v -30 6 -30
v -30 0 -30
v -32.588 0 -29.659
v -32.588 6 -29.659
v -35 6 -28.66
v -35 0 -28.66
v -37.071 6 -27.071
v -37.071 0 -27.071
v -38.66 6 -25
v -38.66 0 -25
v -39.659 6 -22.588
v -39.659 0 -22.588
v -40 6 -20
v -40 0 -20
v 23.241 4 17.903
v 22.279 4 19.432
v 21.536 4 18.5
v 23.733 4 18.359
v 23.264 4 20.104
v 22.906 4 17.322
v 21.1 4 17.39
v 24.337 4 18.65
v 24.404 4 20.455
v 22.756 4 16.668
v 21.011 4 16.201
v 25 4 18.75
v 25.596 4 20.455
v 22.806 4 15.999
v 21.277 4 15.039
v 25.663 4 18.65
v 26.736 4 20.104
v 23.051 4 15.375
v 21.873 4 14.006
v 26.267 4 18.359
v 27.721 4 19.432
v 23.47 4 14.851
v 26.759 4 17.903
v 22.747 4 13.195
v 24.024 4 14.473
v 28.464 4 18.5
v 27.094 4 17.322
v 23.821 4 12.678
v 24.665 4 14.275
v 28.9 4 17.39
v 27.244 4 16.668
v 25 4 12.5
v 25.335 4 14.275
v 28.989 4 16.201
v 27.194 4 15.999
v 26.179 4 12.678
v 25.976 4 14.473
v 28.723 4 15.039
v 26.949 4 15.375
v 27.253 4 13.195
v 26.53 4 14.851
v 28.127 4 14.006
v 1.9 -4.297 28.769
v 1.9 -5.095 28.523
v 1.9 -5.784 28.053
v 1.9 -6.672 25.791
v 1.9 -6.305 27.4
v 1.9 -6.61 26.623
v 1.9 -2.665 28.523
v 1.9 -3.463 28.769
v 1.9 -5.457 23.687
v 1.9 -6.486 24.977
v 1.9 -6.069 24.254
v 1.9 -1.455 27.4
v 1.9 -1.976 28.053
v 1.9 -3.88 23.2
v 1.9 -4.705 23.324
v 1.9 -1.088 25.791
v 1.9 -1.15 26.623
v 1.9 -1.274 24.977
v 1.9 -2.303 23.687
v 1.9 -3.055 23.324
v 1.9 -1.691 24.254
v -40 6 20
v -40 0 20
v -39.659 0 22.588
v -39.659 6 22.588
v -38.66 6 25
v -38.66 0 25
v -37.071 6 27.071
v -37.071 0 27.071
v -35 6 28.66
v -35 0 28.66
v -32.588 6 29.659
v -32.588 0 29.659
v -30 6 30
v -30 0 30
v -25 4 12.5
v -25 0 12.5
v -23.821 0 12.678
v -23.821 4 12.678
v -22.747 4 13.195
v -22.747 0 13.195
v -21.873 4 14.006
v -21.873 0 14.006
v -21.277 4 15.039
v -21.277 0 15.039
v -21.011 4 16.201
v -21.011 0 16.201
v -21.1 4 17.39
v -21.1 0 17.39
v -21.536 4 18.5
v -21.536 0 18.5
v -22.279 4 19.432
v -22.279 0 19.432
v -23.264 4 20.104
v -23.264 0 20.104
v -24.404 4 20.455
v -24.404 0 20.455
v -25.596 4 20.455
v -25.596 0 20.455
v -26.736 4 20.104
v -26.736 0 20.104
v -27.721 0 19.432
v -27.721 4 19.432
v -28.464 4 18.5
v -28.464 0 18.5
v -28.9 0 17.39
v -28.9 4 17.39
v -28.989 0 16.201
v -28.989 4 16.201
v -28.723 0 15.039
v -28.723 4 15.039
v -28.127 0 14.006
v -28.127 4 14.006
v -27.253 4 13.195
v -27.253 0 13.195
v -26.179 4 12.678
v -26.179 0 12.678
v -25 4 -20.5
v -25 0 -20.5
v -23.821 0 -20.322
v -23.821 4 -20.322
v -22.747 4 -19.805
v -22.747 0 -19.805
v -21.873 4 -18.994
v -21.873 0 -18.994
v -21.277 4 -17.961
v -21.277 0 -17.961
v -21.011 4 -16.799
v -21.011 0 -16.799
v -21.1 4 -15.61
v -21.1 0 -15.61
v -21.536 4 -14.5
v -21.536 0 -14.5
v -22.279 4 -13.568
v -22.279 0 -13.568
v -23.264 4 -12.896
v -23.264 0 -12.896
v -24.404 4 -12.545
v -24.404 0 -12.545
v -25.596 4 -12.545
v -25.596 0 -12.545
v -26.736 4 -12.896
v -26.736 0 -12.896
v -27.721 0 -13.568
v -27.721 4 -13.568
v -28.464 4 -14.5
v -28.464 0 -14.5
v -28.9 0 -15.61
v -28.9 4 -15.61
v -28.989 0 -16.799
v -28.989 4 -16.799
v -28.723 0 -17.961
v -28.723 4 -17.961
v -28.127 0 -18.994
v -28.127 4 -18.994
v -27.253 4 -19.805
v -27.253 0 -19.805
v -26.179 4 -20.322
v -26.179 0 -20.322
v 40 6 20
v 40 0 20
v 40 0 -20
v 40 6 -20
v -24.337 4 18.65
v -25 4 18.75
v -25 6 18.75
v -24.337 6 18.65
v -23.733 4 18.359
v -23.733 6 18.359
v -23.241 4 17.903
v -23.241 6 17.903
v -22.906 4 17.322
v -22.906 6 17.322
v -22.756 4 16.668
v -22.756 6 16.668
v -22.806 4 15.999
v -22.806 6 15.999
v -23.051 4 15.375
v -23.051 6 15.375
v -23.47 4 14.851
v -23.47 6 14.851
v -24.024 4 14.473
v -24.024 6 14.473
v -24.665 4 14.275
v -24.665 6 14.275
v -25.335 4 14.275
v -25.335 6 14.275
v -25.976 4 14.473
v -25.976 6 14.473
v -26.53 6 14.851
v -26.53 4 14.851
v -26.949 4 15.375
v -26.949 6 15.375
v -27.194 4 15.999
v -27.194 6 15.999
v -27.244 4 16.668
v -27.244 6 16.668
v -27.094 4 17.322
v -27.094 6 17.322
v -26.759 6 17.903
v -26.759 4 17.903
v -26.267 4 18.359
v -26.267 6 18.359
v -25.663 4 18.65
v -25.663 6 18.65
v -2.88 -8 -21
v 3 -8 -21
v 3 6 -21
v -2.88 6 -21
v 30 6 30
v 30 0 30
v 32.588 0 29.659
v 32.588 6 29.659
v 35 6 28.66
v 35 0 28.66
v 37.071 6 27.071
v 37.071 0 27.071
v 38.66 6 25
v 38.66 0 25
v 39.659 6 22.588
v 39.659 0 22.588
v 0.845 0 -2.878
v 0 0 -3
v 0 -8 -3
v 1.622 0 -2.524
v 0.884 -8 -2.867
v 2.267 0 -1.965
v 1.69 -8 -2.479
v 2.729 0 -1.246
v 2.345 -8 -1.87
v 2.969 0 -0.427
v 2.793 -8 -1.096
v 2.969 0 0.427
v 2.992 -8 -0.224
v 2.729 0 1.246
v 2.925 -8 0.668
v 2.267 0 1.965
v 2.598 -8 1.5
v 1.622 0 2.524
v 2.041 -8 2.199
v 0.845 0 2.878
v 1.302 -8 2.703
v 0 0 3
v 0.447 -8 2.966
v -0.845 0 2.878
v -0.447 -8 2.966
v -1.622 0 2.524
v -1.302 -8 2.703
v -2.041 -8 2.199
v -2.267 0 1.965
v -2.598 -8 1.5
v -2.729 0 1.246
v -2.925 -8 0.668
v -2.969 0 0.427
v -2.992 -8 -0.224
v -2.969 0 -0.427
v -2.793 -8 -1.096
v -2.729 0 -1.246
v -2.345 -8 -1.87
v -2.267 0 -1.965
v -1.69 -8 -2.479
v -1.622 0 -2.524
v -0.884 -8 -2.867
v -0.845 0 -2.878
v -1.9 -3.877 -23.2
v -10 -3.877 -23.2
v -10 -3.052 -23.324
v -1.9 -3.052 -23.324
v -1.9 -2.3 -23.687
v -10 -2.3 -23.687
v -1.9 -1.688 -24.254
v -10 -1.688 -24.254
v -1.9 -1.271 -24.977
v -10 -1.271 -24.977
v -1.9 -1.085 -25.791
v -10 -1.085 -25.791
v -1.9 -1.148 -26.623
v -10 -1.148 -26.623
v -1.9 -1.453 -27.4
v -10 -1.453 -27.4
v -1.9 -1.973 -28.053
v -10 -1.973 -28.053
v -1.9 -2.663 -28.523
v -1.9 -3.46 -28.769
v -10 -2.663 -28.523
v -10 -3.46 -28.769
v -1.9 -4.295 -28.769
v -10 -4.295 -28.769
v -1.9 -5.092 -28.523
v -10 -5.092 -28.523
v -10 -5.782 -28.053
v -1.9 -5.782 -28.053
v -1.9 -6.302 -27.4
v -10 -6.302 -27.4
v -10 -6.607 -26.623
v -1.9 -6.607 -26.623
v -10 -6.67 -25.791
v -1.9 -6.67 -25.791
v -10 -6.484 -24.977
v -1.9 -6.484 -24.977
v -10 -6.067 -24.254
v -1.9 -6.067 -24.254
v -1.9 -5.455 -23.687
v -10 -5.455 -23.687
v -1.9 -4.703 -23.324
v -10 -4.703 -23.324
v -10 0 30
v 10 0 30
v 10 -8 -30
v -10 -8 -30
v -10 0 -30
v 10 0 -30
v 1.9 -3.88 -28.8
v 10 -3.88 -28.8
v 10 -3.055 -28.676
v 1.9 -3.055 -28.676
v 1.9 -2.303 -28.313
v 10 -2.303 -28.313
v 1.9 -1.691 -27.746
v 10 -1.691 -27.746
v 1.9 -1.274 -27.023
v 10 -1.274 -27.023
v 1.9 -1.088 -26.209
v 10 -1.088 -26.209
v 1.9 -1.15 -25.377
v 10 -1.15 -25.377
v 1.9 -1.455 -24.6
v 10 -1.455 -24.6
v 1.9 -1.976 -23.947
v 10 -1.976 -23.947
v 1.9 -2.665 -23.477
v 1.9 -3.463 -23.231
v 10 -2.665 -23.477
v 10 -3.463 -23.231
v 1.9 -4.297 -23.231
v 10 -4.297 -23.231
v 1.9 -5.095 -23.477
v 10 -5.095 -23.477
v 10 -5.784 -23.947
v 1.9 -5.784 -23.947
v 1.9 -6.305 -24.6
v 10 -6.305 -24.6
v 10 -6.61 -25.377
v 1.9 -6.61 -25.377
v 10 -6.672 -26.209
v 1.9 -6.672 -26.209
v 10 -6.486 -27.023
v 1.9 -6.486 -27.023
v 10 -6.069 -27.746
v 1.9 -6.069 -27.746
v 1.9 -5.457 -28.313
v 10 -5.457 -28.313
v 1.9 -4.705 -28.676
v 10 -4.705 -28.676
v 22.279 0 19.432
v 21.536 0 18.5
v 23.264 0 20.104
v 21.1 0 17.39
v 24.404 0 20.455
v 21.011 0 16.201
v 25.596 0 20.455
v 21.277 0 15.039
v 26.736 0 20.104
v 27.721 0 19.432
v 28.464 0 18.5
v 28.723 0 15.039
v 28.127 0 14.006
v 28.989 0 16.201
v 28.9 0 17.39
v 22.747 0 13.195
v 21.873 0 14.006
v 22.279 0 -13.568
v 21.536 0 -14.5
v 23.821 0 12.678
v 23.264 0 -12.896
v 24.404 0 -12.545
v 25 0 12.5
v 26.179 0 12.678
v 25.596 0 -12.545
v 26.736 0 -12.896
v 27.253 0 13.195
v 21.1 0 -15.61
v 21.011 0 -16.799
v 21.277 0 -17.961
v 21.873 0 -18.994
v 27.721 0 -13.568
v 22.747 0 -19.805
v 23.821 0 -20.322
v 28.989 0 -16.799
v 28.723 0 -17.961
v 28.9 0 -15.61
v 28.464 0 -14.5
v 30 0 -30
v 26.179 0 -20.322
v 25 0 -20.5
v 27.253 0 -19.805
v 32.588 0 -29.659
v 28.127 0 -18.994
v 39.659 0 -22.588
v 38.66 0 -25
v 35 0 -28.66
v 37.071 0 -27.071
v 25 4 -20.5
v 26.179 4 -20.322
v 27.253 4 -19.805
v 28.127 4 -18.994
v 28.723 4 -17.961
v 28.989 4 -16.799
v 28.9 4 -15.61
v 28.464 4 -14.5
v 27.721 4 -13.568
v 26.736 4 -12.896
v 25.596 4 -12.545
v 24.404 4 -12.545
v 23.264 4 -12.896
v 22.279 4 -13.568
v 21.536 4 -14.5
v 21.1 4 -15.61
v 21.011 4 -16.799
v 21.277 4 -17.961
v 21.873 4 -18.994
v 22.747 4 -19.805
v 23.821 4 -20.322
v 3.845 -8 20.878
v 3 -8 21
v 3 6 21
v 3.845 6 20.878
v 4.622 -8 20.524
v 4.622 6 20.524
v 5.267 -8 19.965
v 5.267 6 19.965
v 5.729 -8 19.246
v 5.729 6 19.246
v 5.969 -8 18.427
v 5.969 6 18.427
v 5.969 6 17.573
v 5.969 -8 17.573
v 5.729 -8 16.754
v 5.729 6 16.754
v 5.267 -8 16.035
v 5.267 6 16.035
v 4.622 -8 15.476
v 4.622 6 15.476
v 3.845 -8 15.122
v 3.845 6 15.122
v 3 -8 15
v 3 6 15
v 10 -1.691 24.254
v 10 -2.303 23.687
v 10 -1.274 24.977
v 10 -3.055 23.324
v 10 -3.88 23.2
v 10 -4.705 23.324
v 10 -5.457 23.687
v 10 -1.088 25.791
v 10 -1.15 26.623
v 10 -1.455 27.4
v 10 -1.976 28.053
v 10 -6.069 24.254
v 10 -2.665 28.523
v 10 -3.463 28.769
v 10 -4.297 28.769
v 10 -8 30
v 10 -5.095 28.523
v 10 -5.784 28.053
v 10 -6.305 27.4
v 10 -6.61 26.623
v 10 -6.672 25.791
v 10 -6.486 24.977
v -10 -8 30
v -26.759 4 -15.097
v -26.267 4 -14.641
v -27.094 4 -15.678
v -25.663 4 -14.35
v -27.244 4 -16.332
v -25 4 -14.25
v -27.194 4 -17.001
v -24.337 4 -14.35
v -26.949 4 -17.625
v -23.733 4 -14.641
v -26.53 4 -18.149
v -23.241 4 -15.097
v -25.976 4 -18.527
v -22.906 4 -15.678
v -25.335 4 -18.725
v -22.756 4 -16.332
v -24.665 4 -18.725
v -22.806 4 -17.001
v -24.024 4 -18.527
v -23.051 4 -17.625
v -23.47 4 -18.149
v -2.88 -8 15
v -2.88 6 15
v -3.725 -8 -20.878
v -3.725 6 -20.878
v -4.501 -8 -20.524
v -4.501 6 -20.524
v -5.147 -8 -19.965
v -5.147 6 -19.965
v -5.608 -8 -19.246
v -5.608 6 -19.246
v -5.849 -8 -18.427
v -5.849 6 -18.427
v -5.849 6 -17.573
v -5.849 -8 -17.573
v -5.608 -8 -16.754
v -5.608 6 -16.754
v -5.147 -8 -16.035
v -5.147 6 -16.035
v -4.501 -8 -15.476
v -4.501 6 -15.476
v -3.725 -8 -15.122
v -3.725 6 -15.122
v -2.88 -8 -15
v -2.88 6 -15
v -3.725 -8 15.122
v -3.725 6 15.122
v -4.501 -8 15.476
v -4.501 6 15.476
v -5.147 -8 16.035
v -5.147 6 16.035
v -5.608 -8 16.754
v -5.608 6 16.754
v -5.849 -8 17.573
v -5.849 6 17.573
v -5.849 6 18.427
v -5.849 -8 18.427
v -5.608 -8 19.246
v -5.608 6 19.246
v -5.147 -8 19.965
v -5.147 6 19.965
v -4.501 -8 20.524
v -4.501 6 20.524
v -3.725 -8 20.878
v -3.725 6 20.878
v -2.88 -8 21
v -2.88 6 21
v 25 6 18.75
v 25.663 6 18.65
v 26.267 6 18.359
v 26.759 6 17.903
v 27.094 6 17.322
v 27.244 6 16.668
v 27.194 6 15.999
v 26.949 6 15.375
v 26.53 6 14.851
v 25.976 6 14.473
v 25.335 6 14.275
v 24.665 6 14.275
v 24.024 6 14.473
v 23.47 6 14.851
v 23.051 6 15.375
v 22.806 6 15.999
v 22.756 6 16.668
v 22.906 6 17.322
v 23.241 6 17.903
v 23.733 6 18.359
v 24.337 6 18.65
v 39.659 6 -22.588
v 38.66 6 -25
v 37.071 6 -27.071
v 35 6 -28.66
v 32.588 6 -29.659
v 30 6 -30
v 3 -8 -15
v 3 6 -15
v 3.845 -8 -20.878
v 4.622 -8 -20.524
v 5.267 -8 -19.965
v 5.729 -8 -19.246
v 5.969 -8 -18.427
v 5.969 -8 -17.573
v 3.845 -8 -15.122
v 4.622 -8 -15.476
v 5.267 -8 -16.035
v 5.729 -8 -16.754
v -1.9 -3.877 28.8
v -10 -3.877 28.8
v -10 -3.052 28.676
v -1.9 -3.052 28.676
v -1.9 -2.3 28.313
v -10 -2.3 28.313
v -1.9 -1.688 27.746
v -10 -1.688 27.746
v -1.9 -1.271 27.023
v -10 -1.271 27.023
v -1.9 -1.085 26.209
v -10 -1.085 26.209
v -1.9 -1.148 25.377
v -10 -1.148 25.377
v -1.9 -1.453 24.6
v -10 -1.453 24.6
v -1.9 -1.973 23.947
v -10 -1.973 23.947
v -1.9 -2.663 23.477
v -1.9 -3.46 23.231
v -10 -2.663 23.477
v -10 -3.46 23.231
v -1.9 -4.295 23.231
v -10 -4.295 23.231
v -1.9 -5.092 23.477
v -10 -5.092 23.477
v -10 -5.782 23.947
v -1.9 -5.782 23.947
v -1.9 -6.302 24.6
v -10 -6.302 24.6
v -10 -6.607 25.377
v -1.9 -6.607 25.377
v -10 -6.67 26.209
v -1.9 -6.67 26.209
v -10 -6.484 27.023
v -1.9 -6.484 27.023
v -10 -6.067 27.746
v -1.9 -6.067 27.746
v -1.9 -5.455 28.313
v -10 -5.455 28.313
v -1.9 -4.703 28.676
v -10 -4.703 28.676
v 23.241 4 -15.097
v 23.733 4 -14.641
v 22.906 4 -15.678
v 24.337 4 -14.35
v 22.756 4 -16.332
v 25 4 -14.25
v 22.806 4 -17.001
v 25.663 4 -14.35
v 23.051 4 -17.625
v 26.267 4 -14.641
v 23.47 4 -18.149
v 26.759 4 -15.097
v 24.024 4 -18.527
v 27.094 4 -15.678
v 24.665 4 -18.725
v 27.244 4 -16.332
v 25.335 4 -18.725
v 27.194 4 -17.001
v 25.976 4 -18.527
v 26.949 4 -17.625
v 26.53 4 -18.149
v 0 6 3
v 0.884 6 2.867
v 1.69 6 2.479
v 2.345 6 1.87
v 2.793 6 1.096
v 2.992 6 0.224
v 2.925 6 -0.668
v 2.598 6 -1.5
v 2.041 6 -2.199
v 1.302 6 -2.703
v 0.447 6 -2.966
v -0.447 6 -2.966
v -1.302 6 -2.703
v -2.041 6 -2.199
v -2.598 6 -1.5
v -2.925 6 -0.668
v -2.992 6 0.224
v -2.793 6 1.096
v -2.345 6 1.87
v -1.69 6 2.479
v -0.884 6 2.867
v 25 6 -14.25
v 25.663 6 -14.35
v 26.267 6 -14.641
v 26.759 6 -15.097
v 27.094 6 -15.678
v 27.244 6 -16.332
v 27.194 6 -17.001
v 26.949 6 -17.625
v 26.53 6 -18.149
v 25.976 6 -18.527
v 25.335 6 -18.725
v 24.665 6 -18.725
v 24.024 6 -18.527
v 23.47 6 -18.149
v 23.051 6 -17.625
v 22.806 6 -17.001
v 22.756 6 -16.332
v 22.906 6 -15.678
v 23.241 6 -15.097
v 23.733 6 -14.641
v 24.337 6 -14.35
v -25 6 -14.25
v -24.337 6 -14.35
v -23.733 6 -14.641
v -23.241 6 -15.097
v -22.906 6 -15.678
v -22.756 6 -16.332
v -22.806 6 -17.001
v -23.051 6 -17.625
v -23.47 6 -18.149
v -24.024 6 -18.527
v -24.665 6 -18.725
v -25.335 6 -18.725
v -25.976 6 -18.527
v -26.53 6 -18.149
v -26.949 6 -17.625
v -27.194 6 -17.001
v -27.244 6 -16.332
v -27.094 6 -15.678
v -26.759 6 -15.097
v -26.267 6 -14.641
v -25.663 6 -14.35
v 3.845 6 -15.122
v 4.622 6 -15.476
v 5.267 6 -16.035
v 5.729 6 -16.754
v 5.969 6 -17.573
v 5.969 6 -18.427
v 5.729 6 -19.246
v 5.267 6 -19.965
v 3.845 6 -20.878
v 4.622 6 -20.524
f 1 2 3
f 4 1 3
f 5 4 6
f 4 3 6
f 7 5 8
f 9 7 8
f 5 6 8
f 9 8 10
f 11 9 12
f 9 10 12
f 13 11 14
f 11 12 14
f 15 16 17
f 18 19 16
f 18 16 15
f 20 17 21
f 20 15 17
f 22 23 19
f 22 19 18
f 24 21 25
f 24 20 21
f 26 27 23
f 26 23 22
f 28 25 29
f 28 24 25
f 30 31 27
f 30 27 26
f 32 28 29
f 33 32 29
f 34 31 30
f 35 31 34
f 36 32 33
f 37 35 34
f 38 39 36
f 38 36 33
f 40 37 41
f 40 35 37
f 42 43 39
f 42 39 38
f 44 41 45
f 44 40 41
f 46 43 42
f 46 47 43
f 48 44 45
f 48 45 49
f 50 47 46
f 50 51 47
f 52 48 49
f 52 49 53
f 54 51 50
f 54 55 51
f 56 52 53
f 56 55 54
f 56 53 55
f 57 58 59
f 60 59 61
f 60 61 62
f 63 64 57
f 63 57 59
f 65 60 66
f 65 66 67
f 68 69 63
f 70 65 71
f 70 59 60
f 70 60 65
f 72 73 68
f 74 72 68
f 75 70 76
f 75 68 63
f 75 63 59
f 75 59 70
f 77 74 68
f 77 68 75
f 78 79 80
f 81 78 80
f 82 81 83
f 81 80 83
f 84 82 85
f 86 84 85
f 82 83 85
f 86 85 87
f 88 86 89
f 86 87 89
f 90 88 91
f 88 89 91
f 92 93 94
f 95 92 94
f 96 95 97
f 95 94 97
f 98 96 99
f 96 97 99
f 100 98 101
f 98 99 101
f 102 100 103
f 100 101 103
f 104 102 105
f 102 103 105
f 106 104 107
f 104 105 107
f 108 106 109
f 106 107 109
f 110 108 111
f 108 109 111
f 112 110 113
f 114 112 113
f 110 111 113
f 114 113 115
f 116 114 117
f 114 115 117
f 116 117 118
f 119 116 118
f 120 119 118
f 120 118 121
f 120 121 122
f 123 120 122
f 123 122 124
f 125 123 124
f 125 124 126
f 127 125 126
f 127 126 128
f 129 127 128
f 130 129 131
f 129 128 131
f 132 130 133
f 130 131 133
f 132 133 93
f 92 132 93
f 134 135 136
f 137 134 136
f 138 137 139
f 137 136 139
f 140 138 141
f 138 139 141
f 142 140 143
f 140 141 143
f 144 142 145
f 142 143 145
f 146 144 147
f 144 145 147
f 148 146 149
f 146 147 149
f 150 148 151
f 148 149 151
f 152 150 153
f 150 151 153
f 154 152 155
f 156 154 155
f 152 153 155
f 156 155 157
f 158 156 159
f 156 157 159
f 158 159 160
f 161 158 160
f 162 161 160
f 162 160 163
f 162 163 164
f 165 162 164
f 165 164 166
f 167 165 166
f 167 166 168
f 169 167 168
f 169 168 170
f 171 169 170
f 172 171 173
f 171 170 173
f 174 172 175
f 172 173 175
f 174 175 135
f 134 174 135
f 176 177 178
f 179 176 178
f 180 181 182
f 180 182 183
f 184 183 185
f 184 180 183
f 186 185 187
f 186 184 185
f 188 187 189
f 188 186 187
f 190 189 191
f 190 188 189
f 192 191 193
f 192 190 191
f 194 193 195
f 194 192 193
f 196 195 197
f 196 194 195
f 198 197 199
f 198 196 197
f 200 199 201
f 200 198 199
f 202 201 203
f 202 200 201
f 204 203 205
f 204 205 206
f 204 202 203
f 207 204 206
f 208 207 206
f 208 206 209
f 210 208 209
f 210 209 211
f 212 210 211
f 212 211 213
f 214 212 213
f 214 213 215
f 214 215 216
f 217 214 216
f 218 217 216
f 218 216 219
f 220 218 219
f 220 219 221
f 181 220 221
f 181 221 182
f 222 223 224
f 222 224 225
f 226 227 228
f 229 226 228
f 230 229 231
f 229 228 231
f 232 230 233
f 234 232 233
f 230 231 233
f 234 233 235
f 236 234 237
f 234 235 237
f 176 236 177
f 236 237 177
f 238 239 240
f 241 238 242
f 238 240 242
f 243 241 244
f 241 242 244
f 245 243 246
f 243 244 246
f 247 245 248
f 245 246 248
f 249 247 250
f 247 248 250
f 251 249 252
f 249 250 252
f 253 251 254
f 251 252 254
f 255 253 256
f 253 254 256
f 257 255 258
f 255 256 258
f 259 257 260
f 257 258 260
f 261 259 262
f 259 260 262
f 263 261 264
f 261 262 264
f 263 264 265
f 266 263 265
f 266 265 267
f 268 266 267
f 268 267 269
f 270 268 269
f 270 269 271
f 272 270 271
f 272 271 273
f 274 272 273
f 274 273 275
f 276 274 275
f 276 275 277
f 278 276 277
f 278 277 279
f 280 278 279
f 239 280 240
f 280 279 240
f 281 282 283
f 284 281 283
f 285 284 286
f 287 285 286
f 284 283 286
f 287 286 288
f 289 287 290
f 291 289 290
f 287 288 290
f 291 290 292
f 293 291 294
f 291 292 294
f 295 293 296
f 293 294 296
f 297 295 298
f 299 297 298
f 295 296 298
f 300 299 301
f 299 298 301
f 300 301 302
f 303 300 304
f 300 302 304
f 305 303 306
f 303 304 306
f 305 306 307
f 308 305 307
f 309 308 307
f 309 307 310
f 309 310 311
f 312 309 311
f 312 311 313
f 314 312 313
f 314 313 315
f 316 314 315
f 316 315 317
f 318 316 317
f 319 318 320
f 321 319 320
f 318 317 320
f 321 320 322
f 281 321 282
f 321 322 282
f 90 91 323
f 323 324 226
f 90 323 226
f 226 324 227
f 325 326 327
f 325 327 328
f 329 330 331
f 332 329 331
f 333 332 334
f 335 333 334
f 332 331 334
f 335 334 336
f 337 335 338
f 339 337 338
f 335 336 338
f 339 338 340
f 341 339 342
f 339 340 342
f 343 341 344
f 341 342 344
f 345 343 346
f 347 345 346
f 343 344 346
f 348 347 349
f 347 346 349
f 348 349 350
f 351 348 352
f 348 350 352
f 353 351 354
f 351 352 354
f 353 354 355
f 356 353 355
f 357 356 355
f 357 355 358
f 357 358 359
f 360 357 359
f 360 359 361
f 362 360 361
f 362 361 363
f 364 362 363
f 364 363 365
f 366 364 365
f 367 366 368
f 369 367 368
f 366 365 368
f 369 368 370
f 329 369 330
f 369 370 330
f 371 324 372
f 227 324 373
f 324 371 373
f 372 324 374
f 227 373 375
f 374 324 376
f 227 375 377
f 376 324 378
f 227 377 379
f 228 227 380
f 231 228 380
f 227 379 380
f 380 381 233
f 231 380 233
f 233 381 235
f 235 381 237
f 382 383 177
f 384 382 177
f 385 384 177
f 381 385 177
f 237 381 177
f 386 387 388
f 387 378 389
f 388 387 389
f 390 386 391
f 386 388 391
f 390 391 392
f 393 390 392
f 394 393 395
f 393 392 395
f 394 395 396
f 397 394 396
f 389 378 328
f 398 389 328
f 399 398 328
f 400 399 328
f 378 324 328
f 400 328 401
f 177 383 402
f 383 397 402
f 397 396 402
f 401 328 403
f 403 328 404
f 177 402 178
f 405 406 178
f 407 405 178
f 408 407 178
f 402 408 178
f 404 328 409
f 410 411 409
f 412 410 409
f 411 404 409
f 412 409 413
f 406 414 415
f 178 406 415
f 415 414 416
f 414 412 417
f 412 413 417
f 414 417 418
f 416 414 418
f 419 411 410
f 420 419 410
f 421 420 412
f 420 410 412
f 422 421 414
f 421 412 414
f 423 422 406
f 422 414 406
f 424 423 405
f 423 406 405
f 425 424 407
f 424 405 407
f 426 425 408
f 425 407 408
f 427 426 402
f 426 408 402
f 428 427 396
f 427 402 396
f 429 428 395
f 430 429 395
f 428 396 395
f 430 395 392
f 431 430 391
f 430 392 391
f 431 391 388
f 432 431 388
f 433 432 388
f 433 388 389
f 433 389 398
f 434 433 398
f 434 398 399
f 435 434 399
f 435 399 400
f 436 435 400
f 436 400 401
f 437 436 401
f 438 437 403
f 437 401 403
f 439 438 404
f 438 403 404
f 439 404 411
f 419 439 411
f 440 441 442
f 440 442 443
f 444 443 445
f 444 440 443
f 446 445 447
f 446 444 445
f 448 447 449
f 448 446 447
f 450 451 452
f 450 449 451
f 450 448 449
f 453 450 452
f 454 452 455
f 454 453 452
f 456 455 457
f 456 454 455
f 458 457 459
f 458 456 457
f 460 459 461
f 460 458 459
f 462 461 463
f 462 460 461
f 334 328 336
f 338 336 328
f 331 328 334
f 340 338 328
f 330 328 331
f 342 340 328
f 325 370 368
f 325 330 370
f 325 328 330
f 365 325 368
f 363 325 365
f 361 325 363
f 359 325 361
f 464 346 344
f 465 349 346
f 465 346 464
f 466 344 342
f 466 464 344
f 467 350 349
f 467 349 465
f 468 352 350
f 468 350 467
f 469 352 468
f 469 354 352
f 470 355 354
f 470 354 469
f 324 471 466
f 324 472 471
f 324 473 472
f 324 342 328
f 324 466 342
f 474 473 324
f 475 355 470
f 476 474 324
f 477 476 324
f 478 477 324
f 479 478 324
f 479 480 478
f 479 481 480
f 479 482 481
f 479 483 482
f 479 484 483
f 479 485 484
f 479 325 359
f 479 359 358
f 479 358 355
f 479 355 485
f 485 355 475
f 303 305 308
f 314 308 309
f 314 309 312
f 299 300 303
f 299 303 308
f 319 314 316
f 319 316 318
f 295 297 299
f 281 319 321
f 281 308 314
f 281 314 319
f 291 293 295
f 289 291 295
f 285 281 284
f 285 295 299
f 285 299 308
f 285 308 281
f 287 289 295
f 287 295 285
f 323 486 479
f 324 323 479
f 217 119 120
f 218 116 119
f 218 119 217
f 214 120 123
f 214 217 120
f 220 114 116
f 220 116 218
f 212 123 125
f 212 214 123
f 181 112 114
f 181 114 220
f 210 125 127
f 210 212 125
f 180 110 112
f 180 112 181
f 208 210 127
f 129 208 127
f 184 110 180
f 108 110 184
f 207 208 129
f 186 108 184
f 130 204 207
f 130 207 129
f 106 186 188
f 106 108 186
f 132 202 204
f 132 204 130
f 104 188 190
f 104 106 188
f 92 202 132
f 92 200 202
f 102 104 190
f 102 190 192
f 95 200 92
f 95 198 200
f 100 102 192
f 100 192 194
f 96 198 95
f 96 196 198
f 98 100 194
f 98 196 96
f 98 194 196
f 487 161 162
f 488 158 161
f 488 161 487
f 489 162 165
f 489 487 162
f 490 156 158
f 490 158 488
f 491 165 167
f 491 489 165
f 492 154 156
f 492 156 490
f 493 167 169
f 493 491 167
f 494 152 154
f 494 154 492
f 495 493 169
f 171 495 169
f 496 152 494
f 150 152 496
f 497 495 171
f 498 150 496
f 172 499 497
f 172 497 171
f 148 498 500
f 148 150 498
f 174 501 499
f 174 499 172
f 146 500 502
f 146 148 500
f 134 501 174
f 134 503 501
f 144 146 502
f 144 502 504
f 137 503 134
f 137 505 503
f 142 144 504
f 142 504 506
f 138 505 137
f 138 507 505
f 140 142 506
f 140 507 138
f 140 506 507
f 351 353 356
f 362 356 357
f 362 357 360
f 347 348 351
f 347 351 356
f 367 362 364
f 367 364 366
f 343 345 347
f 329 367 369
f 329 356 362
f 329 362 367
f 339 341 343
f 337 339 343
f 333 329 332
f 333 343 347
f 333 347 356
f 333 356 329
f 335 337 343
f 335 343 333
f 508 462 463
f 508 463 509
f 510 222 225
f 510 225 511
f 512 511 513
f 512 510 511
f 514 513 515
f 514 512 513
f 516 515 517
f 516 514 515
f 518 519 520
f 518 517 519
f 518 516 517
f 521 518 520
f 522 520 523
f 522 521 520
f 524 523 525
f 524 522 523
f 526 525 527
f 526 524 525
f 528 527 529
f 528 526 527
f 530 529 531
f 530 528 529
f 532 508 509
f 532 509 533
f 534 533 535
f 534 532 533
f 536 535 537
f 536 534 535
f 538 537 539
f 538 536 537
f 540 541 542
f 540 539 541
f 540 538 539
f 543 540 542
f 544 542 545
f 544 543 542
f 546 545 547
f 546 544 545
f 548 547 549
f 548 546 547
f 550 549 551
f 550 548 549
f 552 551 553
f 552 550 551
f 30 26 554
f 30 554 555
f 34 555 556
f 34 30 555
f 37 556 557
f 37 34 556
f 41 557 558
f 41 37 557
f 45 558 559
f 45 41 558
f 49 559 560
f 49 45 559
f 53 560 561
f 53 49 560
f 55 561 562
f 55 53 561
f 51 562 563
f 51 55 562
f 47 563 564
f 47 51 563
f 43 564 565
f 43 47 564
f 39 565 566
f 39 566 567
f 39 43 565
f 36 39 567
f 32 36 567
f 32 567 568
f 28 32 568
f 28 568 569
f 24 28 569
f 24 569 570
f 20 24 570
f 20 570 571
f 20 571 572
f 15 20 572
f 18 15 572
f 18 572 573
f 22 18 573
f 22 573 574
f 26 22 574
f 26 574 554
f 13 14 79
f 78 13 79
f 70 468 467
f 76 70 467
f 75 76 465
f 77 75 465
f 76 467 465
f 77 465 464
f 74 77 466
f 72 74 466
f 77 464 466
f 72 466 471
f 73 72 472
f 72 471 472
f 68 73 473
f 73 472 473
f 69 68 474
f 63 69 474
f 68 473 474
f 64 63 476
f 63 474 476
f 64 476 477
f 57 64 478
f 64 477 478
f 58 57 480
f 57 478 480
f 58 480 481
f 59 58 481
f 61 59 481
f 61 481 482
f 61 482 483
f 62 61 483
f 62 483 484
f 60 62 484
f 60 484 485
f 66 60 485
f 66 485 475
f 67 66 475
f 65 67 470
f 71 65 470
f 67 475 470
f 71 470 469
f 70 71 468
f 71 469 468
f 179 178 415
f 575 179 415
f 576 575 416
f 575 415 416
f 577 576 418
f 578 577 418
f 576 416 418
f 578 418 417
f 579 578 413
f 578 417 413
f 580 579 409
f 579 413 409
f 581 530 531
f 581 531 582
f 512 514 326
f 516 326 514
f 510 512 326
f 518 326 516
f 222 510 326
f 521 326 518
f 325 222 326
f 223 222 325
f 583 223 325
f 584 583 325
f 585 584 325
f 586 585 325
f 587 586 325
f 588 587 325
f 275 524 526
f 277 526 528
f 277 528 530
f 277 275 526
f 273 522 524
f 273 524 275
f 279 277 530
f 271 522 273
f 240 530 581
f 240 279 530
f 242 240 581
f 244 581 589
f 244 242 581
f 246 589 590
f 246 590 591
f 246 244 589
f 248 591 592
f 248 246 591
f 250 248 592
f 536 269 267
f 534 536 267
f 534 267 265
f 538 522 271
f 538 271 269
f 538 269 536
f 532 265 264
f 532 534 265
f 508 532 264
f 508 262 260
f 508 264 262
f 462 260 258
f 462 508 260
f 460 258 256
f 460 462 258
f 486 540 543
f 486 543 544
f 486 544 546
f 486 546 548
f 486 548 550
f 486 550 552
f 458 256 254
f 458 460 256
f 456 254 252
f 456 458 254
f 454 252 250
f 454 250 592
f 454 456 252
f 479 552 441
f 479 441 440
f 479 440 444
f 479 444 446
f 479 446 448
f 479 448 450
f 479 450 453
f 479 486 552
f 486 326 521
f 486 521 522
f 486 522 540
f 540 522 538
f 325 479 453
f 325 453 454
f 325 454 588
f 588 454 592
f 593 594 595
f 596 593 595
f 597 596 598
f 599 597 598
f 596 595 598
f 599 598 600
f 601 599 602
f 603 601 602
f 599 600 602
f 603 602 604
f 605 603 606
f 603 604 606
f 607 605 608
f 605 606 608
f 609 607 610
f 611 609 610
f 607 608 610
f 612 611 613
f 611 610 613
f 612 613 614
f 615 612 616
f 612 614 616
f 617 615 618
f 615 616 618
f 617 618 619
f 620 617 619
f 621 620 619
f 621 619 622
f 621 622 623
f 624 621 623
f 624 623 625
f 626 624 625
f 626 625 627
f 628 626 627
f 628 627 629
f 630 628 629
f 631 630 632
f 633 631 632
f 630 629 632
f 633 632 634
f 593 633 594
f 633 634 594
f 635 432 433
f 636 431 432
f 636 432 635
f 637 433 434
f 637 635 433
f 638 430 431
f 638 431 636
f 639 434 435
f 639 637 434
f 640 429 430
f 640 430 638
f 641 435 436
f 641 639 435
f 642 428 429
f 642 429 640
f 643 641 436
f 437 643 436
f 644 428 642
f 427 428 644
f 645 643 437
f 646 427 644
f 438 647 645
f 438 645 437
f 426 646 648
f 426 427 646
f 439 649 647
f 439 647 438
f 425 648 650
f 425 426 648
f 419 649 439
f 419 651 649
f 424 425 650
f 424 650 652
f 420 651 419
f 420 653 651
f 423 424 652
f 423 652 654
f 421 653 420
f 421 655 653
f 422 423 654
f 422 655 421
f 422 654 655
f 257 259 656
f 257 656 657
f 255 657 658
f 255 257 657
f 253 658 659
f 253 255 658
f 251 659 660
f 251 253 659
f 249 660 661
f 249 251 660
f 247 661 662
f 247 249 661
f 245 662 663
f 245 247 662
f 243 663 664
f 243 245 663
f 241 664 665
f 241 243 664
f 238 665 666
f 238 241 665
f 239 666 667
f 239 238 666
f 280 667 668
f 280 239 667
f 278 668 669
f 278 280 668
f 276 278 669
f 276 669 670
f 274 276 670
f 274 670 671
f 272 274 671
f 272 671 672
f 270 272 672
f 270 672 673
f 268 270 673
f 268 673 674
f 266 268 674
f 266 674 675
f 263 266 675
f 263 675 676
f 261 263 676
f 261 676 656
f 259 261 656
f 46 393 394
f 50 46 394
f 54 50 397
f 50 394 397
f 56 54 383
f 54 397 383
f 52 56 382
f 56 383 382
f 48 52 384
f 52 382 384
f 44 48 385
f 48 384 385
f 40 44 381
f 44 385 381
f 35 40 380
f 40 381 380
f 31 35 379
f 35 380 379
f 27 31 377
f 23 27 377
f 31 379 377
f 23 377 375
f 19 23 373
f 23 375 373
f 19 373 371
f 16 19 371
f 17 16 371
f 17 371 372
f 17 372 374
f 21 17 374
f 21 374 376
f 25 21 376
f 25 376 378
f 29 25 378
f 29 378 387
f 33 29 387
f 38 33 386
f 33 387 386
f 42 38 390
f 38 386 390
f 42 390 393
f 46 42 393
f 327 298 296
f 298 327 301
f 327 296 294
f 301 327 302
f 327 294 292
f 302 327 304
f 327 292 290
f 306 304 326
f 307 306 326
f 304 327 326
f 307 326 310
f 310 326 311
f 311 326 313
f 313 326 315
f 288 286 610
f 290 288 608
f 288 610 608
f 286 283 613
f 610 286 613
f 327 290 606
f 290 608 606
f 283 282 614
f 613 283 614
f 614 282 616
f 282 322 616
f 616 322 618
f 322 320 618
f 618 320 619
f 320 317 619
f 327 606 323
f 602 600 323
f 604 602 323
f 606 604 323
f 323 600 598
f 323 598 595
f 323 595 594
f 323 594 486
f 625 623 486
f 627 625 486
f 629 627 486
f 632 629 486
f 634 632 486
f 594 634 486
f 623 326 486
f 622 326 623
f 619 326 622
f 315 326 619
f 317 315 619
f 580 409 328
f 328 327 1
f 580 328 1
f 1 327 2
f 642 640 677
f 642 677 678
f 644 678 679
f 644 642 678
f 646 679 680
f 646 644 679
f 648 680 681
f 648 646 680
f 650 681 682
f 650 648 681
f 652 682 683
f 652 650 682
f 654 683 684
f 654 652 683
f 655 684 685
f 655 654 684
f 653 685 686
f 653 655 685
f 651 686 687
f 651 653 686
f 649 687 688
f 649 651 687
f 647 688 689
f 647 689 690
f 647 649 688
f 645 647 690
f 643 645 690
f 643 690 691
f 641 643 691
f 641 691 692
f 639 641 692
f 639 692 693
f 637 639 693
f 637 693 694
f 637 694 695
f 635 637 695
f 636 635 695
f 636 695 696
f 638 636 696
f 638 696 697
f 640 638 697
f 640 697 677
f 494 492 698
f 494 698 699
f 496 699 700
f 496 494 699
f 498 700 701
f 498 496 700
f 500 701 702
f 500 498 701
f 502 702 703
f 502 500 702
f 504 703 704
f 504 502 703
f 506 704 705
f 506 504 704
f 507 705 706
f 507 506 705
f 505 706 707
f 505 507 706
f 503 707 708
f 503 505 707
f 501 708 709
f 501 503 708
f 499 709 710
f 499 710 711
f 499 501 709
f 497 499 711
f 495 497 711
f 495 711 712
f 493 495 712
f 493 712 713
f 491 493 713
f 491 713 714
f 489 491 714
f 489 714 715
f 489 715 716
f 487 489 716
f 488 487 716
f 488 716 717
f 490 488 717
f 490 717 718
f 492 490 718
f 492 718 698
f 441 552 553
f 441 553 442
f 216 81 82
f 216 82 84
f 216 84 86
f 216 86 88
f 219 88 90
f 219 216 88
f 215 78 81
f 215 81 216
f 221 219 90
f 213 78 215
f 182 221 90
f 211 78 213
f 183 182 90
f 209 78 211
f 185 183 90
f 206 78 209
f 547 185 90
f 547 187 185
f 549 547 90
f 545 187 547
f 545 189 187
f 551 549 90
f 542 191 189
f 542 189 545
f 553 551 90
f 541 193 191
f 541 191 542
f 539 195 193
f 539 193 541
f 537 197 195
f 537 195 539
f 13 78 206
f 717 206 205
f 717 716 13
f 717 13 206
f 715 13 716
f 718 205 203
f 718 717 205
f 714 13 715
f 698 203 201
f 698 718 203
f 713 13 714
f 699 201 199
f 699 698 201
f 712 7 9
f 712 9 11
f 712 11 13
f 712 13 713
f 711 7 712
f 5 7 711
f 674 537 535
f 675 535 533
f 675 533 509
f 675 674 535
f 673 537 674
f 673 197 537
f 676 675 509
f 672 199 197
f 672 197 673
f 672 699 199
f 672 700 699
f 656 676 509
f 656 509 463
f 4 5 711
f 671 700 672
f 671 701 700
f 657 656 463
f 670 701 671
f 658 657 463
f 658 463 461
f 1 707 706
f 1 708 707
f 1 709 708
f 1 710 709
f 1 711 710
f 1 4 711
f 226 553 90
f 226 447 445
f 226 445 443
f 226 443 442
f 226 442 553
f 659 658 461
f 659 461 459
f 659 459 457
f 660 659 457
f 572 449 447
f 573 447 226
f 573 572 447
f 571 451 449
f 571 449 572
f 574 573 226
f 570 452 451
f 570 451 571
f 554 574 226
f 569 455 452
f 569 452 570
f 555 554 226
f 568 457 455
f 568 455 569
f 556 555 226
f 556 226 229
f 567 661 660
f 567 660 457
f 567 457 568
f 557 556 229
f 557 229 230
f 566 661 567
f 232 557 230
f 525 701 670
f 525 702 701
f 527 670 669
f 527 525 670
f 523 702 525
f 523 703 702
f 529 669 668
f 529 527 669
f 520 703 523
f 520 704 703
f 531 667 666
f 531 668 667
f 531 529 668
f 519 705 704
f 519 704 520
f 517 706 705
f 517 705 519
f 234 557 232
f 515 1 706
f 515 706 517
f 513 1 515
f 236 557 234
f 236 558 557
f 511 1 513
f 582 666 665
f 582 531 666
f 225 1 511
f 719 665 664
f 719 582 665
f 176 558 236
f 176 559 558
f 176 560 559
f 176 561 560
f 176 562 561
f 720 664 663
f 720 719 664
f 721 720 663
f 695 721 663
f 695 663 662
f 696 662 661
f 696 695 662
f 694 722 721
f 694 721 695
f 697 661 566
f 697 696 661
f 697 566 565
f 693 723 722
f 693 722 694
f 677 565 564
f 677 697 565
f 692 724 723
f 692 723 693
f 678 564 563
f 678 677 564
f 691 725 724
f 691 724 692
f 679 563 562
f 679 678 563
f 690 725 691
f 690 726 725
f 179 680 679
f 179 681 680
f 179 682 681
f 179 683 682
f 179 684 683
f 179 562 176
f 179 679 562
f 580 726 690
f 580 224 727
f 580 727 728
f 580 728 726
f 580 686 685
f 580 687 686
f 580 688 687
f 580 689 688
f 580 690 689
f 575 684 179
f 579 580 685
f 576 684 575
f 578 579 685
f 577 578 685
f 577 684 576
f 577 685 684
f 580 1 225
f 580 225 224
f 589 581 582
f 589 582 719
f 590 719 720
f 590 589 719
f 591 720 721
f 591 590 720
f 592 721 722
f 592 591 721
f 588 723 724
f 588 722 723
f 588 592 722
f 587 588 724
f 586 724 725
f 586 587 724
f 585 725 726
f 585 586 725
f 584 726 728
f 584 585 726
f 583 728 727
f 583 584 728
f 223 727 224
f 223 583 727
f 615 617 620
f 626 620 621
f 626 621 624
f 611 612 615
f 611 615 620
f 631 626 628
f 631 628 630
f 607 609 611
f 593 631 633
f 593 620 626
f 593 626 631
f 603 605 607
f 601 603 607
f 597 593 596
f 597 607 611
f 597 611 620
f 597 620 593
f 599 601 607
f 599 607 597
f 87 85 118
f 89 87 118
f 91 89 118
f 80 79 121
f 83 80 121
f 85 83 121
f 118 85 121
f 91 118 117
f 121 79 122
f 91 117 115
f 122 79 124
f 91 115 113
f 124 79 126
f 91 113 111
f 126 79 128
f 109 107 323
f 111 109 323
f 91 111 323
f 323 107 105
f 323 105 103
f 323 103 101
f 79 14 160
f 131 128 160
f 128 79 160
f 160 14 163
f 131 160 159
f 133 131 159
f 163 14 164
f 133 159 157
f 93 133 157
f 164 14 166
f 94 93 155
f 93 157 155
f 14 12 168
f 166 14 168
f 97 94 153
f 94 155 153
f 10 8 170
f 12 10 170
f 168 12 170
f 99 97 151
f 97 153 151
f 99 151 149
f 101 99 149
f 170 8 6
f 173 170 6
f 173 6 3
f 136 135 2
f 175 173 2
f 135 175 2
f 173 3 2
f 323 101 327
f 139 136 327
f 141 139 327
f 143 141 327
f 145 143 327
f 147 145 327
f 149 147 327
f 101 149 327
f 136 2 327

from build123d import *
from build123d.topology import SkipClean

# Parameters (mm, degrees)
ESQUISSE1_R              = 2.25
ESQUISSE1_R_2            = 3
BOSS_EXTRU_3_DEPTH       = 6
BOSS_EXTRU_4_START       = 8
ESQUISSE2_W              = 20
ESQUISSE2_H              = 60
ESQUISSE2_R              = 3
BOSS_EXTRU_4_DEPTH       = 8
ESQUISSE3_R              = 4
ENL_V_MAT_EXTRU_2_DEPTH  = 4
ESQUISSE7_R              = 2.8
ENL_V_MAT_EXTRU_8_DEPTH  = 8.1
ENL_V_MAT_EXTRU_9_DEPTH  = 52.923019943
ESQUISSE9_R              = 2.8
ENL_V_MAT_EXTRU_10_DEPTH = 8.1


with BuildPart() as part:
    # Esquisse1 → Boss.-Extru.3 (new body)
    with BuildSketch(Plane(origin=(0, 0, 0), x_dir=(1, 0, 0), z_dir=(0, 1, 0))):
        with BuildLine():
            Line((-29.104707822, 30), (-30, 30))
            ThreePointArc((-30, 30), (-37.071067812, 27.071067812), (-40, 20))
            Line((-40, 20), (-40, -20))
            ThreePointArc((-40, -20), (-37.071067812, -27.071067812), (-30, -30))
            Line((-30, -30), (-29.104707822, -30))
            Line((-29.104707822, -30), (-9.104707822, -30))
            Line((-9.104707822, -30), (30, -30))
            ThreePointArc((30, -30), (37.071067812, -27.071067812), (40, -20))
            Line((40, -20), (40, 20))
            ThreePointArc((40, 20), (37.071067812, 27.071067812), (30, 30))
            Line((30, 30), (-9.104707822, 30))
            Line((-9.104707822, 30), (-29.104707822, 30))
        make_face()
        with Locations(Location((-25, -16.5, 0), (0, 0, 270))):
            Circle(ESQUISSE1_R, mode=Mode.SUBTRACT)
        with Locations(Location((25, -16.5, 0), (0, 0, 270))):
            Circle(ESQUISSE1_R, mode=Mode.SUBTRACT)
        with Locations(Location((0, 0, 0), (0, 0, 270))):
            Circle(ESQUISSE1_R_2, mode=Mode.SUBTRACT)
        with Locations(Location((-25, 16.5, 0), (0, 0, 270))):
            Circle(ESQUISSE1_R, mode=Mode.SUBTRACT)
        with Locations(Location((25, 16.5, 0), (0, 0, 270))):
            Circle(ESQUISSE1_R, mode=Mode.SUBTRACT)
    extrude(amount=BOSS_EXTRU_3_DEPTH)

    # Esquisse2 → Boss.-Extru.4 (add)
    with SkipClean():  # the faces are left unmerged after this step: merging them gives an invalid solid
        with BuildSketch(Plane.XZ.offset(BOSS_EXTRU_4_START)):
            Rectangle(ESQUISSE2_W, ESQUISSE2_H)
            with Locations(Location((0, 0, 0), (0, 0, 270))):
                Circle(ESQUISSE2_R, mode=Mode.SUBTRACT)
        extrude(amount=-BOSS_EXTRU_4_DEPTH)

    # Esquisse3 → Enlèv. mat.-Extru.2 (cut)
    with SkipClean():  # the faces are left unmerged after this step: merging them gives an invalid solid
        with BuildSketch(Plane.XZ):
            with Locations(Location((-25, 16.5, 0), (0, 0, 270))):
                Circle(ESQUISSE3_R)
            with Locations(Location((25, 16.5, 0), (0, 0, 270))):
                Circle(ESQUISSE3_R)
            with Locations(Location((25, -16.5, 0), (0, 0, 270))):
                Circle(ESQUISSE3_R)
            with Locations(Location((-25, -16.5, 0), (0, 0, 270))):
                Circle(ESQUISSE3_R)
        extrude(amount=-ENL_V_MAT_EXTRU_2_DEPTH, mode=Mode.SUBTRACT)

    # Esquisse7 → Enlèv. mat.-Extru.8 (cut)
    with SkipClean():  # the faces are left unmerged after this step: merging them gives an invalid solid
        with BuildSketch(Plane.ZY.offset(10)):
            with Locations((26, -3.87740141)):
                Circle(ESQUISSE7_R)
            with Locations((-26, -3.87740141)):
                Circle(ESQUISSE7_R)
        extrude(amount=-ENL_V_MAT_EXTRU_8_DEPTH, mode=Mode.SUBTRACT)

    # Esquisse8 → Enlèv. mat.-Extru.9 (cut, through all)
    with SkipClean():  # the faces are left unmerged after this step: merging them gives an invalid solid
        with BuildSketch(Plane.XZ.offset(8)):
            with BuildLine():
                Line((-2.879526134, 21), (3, 21))
                ThreePointArc((3, 21), (6, 18), (3, 15))
                Line((3, 15), (-2.879526134, 15))
                ThreePointArc((-2.879526134, 15), (-5.879526134, 18), (-2.879526134, 21))
            make_face()
            with BuildLine():
                Line((-2.879526134, -15), (3, -15))
                ThreePointArc((3, -15), (6, -18), (3, -21))
                Line((3, -21), (-2.879526134, -21))
                ThreePointArc((-2.879526134, -21), (-5.879526134, -18), (-2.879526134, -15))
            make_face()
        extrude(amount=-ENL_V_MAT_EXTRU_9_DEPTH, mode=Mode.SUBTRACT)

    # Esquisse9 → Enlèv. mat.-Extru.10 (cut)
    with SkipClean():  # the faces are left unmerged after this step: merging them gives an invalid solid
        with BuildSketch(Plane(origin=(10, 0, 0), x_dir=(0, 0, -1), z_dir=(1, 0, 0))):
            with Locations((-26, -3.88)):
                Circle(ESQUISSE9_R)
            with Locations((26, -3.88)):
                Circle(ESQUISSE9_R)
        extrude(amount=-ENL_V_MAT_EXTRU_10_DEPTH, mode=Mode.SUBTRACT)


solid = part.part
